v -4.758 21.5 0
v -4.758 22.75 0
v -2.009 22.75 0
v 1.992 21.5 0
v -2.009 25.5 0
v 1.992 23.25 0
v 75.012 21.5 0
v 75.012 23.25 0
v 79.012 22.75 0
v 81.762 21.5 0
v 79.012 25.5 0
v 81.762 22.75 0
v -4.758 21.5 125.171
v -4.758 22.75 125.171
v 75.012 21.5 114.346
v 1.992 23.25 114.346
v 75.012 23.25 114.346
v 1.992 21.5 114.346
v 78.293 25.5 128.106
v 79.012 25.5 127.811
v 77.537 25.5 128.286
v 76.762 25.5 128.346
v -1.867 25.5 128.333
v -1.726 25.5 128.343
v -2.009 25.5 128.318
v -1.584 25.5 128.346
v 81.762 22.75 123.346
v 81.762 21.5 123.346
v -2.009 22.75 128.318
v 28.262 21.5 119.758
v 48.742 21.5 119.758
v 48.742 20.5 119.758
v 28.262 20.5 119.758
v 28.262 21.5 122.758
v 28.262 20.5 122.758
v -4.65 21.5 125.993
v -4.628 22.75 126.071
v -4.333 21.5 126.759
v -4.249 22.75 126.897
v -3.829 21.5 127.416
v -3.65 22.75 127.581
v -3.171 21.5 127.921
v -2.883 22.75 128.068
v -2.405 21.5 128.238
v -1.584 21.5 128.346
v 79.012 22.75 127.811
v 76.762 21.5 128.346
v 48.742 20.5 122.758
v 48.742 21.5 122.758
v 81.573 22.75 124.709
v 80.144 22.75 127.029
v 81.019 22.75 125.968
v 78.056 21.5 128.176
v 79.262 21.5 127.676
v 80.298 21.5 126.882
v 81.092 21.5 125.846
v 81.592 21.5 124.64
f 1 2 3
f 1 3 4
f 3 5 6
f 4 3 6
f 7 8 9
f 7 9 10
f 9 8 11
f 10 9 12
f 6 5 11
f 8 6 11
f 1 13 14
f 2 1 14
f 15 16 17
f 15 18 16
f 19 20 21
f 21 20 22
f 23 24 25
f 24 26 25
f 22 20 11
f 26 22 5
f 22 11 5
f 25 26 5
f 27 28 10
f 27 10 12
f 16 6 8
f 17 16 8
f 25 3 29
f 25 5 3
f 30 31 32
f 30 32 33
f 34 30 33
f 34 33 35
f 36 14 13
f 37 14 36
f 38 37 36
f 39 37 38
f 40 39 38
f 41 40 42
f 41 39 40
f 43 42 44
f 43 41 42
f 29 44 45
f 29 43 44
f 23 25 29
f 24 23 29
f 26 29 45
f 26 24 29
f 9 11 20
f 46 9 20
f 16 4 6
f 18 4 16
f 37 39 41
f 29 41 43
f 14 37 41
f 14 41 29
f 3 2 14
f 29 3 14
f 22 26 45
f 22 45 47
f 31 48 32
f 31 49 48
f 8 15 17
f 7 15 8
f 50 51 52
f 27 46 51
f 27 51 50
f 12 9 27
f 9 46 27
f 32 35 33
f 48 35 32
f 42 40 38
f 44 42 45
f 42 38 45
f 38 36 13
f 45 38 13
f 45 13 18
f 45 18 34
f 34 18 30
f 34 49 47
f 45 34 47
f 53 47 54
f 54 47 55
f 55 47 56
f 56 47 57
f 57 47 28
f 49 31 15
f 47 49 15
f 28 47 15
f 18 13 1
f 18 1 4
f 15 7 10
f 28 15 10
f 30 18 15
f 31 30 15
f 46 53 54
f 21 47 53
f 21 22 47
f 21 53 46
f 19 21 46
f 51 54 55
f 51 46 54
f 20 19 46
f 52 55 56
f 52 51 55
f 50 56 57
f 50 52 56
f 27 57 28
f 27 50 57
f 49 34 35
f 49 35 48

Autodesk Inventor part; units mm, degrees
ref_plane "YZ Plane" through (0, 0, 0) normal (1, 0, 0) x (0, 1, 0)
ref_plane "XZ Plane" through (0, 0, 0) normal (0, 1, 0) x (-1, 0, 0)
ref_plane "XY Plane" through (0, 0, 0) normal (0, 0, 1) x (1, 0, 0)
sketch "Sketch1" plane through (0, 0, 0) normal (0, 0, 1) x (1, 0, 0)
  line L0 (-2.7585, 21.5) -> (79.762, 21.5)
  line L1 (79.762, 23.5) -> (79.762, 25.5)
  line L2 (79.762, 25.5) -> (-2.7585, 25.5)
  line L3 (-2.7585, 25.5) -> (-2.7585, 23.5)
  line L4 (-2.7585, 21.5) -> (-4.7585, 21.5)
  line L5 (-4.7585, 21.5) -> (-4.7585, 23.5)
  line L6 (-4.7585, 23.5) -> (-2.7585, 23.5)
  line L7 (-2.7585, 23.5) -> (-2.7585, 21.5)
  line L8 (79.762, 25.5) -> (-2.7585, 25.5)
  line L9 (81.762, 23.5) -> (79.762, 23.5)
  line L10 (79.762, 21.5) -> (81.762, 21.5)
  line L11 (81.762, 21.5) -> (81.762, 23.5)
  point P0 (0, 0)
  point P1 (2.8, 2)
  dimension "d0" = 4
  dimension "d1" = 2
  dimension "d2" = 2
extrude "Extrusion1" add sketch "Sketch1" along normal blind 128.3462
sketch "Sketch3" plane through (-4.7585, 21.5, 0) normal (0, -1, 0) x (1, 0, 0)
  line L0 (0, 128.3462) -> (86.5205, 128.3462) projected
  arc A0 (3.175, 128.3462) -> (0, 125.1712) centre (3.175, 125.1712) ccw
  arc A1 (86.5205, 123.3462) -> (81.5205, 128.3462) centre (81.5205, 123.3462) ccw
  line L1 (0, 0) -> (0, 128.3462) projected
  line L2 (0, 128.3462) -> (3.175, 128.3462)
  line L3 (0, 128.3462) -> (0, 125.1712)
  line L4 (81.5205, 128.3462) -> (86.5205, 128.3462)
  line L5 (86.5205, 128.3462) -> (86.5205, 123.3462)
  point P0 (4.7585, 0)
  dimension "d5" = 3.175
  dimension "d6" = 5
extrude "Extrusion2" cut sketch "Sketch3" along normal mid plane 128.3462
sketch "Sketch4" plane through (79.762, 23.5, 127.3462) normal (0, 1, 0) x (1, 0, 0)
  line L0 (-84.5205, 127.3462) -> (-84.5205, 2.175) projected
  line L1 (-82.5205, 127.3462) -> (-82.5205, -0.7746) projected
  line L2 (0, 127.3462) -> (0, 0) projected
  line L3 (2, 127.3462) -> (2, 4) projected
  line L4 (2, 127.3462) -> (0, 127.3462) projected
  line L5 (-82.5205, 127.3462) -> (-84.5205, 127.3462) projected
  arc A0 (-84.5205, 2.175) -> (-82.5205, -0.7746) centre (-81.3455, 2.175) ccw projected
  arc A1 (0, 0) -> (2, 4) centre (-3, 4) ccw projected
  line L6 (-82.5205, 127.3462) -> (-82.5205, -0.7746) projected
  line L7 (-82.5205, 127.3462) -> (-81.7705, 127.3462)
  line L8 (-81.7705, 127.3462) -> (-81.7705, -1)
  line L9 (-81.7705, -1) -> (-82.5205, -1)
  line L10 (-82.5205, -1) -> (-82.5205, -0.7746)
  line L11 (0, 127.3462) -> (-0.75, 127.3462)
  line L12 (-0.75, 127.3462) -> (-0.75, -1)
  line L13 (-0.75, -1) -> (0, -1)
  line L14 (0, -1) -> (0, 0)
  point P0 (-79.762, 127.3462)
  dimension "d9" = 0.75
  dimension "d10" = 0.75
extrude "Extrusion3" cut sketch "Sketch4" against normal blind 0.75 and the other way blind 25.4
sketch "Sketch5" plane through (-4.7585, 21.5, 0) normal (0, -1, 0) x (1, 0, 0)
  line L0 (33.02, 122.7582) -> (53.5005, 122.7582)
  line L1 (53.5005, 122.7582) -> (53.5005, 119.7582)
  line L2 (53.5005, 119.7582) -> (33.02, 119.7582)
  line L3 (33.02, 119.7582) -> (33.02, 122.7582)
  line L4 (3.175, 128.3462) -> (81.5205, 128.3462) projected
  line L5 (86.5205, 0) -> (86.5205, 123.3462) projected
  line L6 (0, 0) -> (0, 125.1712) projected
  point P0 (4.7585, 0)
  dimension "d15" = 5.588
  dimension "d16" = 33.02
  dimension "d17" = 33.02
  dimension "d18" = 3
extrude "Extrusion4" add sketch "Sketch5" along normal blind 1
sketch "Sketch6" plane through (-4.7585, 21.5, 0) normal (0, -1, 0) x (1, 0, 0)
  line L0 (0, 0) -> (0, 125.1712) projected
  line L1 (83.7705, 127.8113) -> (83.7705, 0) projected
  line L2 (83.7705, 0) -> (2.75, 0) projected
  line L3 (2.75, 0) -> (2.75, 128.3176) projected
  arc A0 (3.175, 128.3462) -> (2.75, 128.3176) centre (3.175, 125.1712) ccw projected
  line L4 (81.5205, 128.3462) -> (3.175, 128.3462) projected
  arc A1 (83.7705, 127.8113) -> (81.5205, 128.3462) centre (81.5205, 123.3462) ccw projected
  line L5 (6.75, 70.3822) -> (6.75, 114.3462)
  line L6 (0, 0) -> (86.5205, 0) projected
  line L7 (6.75, 114.3462) -> (79.7705, 114.3462)
  line L8 (79.7705, 114.3462) -> (79.7705, 0)
  line L9 (79.7705, 0) -> (6.75, 0)
  line L10 (6.75, 0) -> (6.75, 114.3462)
  point P0 (4.7585, 0)
  dimension "d21" = 4
  dimension "d22" = 14
  dimension "d23" = 4
extrude "Extrusion5" cut sketch "Sketch6" against normal blind 1.75 contours L2 L10 L5 L7 L8
properties part number "Capstone Calculator Back Cover"
